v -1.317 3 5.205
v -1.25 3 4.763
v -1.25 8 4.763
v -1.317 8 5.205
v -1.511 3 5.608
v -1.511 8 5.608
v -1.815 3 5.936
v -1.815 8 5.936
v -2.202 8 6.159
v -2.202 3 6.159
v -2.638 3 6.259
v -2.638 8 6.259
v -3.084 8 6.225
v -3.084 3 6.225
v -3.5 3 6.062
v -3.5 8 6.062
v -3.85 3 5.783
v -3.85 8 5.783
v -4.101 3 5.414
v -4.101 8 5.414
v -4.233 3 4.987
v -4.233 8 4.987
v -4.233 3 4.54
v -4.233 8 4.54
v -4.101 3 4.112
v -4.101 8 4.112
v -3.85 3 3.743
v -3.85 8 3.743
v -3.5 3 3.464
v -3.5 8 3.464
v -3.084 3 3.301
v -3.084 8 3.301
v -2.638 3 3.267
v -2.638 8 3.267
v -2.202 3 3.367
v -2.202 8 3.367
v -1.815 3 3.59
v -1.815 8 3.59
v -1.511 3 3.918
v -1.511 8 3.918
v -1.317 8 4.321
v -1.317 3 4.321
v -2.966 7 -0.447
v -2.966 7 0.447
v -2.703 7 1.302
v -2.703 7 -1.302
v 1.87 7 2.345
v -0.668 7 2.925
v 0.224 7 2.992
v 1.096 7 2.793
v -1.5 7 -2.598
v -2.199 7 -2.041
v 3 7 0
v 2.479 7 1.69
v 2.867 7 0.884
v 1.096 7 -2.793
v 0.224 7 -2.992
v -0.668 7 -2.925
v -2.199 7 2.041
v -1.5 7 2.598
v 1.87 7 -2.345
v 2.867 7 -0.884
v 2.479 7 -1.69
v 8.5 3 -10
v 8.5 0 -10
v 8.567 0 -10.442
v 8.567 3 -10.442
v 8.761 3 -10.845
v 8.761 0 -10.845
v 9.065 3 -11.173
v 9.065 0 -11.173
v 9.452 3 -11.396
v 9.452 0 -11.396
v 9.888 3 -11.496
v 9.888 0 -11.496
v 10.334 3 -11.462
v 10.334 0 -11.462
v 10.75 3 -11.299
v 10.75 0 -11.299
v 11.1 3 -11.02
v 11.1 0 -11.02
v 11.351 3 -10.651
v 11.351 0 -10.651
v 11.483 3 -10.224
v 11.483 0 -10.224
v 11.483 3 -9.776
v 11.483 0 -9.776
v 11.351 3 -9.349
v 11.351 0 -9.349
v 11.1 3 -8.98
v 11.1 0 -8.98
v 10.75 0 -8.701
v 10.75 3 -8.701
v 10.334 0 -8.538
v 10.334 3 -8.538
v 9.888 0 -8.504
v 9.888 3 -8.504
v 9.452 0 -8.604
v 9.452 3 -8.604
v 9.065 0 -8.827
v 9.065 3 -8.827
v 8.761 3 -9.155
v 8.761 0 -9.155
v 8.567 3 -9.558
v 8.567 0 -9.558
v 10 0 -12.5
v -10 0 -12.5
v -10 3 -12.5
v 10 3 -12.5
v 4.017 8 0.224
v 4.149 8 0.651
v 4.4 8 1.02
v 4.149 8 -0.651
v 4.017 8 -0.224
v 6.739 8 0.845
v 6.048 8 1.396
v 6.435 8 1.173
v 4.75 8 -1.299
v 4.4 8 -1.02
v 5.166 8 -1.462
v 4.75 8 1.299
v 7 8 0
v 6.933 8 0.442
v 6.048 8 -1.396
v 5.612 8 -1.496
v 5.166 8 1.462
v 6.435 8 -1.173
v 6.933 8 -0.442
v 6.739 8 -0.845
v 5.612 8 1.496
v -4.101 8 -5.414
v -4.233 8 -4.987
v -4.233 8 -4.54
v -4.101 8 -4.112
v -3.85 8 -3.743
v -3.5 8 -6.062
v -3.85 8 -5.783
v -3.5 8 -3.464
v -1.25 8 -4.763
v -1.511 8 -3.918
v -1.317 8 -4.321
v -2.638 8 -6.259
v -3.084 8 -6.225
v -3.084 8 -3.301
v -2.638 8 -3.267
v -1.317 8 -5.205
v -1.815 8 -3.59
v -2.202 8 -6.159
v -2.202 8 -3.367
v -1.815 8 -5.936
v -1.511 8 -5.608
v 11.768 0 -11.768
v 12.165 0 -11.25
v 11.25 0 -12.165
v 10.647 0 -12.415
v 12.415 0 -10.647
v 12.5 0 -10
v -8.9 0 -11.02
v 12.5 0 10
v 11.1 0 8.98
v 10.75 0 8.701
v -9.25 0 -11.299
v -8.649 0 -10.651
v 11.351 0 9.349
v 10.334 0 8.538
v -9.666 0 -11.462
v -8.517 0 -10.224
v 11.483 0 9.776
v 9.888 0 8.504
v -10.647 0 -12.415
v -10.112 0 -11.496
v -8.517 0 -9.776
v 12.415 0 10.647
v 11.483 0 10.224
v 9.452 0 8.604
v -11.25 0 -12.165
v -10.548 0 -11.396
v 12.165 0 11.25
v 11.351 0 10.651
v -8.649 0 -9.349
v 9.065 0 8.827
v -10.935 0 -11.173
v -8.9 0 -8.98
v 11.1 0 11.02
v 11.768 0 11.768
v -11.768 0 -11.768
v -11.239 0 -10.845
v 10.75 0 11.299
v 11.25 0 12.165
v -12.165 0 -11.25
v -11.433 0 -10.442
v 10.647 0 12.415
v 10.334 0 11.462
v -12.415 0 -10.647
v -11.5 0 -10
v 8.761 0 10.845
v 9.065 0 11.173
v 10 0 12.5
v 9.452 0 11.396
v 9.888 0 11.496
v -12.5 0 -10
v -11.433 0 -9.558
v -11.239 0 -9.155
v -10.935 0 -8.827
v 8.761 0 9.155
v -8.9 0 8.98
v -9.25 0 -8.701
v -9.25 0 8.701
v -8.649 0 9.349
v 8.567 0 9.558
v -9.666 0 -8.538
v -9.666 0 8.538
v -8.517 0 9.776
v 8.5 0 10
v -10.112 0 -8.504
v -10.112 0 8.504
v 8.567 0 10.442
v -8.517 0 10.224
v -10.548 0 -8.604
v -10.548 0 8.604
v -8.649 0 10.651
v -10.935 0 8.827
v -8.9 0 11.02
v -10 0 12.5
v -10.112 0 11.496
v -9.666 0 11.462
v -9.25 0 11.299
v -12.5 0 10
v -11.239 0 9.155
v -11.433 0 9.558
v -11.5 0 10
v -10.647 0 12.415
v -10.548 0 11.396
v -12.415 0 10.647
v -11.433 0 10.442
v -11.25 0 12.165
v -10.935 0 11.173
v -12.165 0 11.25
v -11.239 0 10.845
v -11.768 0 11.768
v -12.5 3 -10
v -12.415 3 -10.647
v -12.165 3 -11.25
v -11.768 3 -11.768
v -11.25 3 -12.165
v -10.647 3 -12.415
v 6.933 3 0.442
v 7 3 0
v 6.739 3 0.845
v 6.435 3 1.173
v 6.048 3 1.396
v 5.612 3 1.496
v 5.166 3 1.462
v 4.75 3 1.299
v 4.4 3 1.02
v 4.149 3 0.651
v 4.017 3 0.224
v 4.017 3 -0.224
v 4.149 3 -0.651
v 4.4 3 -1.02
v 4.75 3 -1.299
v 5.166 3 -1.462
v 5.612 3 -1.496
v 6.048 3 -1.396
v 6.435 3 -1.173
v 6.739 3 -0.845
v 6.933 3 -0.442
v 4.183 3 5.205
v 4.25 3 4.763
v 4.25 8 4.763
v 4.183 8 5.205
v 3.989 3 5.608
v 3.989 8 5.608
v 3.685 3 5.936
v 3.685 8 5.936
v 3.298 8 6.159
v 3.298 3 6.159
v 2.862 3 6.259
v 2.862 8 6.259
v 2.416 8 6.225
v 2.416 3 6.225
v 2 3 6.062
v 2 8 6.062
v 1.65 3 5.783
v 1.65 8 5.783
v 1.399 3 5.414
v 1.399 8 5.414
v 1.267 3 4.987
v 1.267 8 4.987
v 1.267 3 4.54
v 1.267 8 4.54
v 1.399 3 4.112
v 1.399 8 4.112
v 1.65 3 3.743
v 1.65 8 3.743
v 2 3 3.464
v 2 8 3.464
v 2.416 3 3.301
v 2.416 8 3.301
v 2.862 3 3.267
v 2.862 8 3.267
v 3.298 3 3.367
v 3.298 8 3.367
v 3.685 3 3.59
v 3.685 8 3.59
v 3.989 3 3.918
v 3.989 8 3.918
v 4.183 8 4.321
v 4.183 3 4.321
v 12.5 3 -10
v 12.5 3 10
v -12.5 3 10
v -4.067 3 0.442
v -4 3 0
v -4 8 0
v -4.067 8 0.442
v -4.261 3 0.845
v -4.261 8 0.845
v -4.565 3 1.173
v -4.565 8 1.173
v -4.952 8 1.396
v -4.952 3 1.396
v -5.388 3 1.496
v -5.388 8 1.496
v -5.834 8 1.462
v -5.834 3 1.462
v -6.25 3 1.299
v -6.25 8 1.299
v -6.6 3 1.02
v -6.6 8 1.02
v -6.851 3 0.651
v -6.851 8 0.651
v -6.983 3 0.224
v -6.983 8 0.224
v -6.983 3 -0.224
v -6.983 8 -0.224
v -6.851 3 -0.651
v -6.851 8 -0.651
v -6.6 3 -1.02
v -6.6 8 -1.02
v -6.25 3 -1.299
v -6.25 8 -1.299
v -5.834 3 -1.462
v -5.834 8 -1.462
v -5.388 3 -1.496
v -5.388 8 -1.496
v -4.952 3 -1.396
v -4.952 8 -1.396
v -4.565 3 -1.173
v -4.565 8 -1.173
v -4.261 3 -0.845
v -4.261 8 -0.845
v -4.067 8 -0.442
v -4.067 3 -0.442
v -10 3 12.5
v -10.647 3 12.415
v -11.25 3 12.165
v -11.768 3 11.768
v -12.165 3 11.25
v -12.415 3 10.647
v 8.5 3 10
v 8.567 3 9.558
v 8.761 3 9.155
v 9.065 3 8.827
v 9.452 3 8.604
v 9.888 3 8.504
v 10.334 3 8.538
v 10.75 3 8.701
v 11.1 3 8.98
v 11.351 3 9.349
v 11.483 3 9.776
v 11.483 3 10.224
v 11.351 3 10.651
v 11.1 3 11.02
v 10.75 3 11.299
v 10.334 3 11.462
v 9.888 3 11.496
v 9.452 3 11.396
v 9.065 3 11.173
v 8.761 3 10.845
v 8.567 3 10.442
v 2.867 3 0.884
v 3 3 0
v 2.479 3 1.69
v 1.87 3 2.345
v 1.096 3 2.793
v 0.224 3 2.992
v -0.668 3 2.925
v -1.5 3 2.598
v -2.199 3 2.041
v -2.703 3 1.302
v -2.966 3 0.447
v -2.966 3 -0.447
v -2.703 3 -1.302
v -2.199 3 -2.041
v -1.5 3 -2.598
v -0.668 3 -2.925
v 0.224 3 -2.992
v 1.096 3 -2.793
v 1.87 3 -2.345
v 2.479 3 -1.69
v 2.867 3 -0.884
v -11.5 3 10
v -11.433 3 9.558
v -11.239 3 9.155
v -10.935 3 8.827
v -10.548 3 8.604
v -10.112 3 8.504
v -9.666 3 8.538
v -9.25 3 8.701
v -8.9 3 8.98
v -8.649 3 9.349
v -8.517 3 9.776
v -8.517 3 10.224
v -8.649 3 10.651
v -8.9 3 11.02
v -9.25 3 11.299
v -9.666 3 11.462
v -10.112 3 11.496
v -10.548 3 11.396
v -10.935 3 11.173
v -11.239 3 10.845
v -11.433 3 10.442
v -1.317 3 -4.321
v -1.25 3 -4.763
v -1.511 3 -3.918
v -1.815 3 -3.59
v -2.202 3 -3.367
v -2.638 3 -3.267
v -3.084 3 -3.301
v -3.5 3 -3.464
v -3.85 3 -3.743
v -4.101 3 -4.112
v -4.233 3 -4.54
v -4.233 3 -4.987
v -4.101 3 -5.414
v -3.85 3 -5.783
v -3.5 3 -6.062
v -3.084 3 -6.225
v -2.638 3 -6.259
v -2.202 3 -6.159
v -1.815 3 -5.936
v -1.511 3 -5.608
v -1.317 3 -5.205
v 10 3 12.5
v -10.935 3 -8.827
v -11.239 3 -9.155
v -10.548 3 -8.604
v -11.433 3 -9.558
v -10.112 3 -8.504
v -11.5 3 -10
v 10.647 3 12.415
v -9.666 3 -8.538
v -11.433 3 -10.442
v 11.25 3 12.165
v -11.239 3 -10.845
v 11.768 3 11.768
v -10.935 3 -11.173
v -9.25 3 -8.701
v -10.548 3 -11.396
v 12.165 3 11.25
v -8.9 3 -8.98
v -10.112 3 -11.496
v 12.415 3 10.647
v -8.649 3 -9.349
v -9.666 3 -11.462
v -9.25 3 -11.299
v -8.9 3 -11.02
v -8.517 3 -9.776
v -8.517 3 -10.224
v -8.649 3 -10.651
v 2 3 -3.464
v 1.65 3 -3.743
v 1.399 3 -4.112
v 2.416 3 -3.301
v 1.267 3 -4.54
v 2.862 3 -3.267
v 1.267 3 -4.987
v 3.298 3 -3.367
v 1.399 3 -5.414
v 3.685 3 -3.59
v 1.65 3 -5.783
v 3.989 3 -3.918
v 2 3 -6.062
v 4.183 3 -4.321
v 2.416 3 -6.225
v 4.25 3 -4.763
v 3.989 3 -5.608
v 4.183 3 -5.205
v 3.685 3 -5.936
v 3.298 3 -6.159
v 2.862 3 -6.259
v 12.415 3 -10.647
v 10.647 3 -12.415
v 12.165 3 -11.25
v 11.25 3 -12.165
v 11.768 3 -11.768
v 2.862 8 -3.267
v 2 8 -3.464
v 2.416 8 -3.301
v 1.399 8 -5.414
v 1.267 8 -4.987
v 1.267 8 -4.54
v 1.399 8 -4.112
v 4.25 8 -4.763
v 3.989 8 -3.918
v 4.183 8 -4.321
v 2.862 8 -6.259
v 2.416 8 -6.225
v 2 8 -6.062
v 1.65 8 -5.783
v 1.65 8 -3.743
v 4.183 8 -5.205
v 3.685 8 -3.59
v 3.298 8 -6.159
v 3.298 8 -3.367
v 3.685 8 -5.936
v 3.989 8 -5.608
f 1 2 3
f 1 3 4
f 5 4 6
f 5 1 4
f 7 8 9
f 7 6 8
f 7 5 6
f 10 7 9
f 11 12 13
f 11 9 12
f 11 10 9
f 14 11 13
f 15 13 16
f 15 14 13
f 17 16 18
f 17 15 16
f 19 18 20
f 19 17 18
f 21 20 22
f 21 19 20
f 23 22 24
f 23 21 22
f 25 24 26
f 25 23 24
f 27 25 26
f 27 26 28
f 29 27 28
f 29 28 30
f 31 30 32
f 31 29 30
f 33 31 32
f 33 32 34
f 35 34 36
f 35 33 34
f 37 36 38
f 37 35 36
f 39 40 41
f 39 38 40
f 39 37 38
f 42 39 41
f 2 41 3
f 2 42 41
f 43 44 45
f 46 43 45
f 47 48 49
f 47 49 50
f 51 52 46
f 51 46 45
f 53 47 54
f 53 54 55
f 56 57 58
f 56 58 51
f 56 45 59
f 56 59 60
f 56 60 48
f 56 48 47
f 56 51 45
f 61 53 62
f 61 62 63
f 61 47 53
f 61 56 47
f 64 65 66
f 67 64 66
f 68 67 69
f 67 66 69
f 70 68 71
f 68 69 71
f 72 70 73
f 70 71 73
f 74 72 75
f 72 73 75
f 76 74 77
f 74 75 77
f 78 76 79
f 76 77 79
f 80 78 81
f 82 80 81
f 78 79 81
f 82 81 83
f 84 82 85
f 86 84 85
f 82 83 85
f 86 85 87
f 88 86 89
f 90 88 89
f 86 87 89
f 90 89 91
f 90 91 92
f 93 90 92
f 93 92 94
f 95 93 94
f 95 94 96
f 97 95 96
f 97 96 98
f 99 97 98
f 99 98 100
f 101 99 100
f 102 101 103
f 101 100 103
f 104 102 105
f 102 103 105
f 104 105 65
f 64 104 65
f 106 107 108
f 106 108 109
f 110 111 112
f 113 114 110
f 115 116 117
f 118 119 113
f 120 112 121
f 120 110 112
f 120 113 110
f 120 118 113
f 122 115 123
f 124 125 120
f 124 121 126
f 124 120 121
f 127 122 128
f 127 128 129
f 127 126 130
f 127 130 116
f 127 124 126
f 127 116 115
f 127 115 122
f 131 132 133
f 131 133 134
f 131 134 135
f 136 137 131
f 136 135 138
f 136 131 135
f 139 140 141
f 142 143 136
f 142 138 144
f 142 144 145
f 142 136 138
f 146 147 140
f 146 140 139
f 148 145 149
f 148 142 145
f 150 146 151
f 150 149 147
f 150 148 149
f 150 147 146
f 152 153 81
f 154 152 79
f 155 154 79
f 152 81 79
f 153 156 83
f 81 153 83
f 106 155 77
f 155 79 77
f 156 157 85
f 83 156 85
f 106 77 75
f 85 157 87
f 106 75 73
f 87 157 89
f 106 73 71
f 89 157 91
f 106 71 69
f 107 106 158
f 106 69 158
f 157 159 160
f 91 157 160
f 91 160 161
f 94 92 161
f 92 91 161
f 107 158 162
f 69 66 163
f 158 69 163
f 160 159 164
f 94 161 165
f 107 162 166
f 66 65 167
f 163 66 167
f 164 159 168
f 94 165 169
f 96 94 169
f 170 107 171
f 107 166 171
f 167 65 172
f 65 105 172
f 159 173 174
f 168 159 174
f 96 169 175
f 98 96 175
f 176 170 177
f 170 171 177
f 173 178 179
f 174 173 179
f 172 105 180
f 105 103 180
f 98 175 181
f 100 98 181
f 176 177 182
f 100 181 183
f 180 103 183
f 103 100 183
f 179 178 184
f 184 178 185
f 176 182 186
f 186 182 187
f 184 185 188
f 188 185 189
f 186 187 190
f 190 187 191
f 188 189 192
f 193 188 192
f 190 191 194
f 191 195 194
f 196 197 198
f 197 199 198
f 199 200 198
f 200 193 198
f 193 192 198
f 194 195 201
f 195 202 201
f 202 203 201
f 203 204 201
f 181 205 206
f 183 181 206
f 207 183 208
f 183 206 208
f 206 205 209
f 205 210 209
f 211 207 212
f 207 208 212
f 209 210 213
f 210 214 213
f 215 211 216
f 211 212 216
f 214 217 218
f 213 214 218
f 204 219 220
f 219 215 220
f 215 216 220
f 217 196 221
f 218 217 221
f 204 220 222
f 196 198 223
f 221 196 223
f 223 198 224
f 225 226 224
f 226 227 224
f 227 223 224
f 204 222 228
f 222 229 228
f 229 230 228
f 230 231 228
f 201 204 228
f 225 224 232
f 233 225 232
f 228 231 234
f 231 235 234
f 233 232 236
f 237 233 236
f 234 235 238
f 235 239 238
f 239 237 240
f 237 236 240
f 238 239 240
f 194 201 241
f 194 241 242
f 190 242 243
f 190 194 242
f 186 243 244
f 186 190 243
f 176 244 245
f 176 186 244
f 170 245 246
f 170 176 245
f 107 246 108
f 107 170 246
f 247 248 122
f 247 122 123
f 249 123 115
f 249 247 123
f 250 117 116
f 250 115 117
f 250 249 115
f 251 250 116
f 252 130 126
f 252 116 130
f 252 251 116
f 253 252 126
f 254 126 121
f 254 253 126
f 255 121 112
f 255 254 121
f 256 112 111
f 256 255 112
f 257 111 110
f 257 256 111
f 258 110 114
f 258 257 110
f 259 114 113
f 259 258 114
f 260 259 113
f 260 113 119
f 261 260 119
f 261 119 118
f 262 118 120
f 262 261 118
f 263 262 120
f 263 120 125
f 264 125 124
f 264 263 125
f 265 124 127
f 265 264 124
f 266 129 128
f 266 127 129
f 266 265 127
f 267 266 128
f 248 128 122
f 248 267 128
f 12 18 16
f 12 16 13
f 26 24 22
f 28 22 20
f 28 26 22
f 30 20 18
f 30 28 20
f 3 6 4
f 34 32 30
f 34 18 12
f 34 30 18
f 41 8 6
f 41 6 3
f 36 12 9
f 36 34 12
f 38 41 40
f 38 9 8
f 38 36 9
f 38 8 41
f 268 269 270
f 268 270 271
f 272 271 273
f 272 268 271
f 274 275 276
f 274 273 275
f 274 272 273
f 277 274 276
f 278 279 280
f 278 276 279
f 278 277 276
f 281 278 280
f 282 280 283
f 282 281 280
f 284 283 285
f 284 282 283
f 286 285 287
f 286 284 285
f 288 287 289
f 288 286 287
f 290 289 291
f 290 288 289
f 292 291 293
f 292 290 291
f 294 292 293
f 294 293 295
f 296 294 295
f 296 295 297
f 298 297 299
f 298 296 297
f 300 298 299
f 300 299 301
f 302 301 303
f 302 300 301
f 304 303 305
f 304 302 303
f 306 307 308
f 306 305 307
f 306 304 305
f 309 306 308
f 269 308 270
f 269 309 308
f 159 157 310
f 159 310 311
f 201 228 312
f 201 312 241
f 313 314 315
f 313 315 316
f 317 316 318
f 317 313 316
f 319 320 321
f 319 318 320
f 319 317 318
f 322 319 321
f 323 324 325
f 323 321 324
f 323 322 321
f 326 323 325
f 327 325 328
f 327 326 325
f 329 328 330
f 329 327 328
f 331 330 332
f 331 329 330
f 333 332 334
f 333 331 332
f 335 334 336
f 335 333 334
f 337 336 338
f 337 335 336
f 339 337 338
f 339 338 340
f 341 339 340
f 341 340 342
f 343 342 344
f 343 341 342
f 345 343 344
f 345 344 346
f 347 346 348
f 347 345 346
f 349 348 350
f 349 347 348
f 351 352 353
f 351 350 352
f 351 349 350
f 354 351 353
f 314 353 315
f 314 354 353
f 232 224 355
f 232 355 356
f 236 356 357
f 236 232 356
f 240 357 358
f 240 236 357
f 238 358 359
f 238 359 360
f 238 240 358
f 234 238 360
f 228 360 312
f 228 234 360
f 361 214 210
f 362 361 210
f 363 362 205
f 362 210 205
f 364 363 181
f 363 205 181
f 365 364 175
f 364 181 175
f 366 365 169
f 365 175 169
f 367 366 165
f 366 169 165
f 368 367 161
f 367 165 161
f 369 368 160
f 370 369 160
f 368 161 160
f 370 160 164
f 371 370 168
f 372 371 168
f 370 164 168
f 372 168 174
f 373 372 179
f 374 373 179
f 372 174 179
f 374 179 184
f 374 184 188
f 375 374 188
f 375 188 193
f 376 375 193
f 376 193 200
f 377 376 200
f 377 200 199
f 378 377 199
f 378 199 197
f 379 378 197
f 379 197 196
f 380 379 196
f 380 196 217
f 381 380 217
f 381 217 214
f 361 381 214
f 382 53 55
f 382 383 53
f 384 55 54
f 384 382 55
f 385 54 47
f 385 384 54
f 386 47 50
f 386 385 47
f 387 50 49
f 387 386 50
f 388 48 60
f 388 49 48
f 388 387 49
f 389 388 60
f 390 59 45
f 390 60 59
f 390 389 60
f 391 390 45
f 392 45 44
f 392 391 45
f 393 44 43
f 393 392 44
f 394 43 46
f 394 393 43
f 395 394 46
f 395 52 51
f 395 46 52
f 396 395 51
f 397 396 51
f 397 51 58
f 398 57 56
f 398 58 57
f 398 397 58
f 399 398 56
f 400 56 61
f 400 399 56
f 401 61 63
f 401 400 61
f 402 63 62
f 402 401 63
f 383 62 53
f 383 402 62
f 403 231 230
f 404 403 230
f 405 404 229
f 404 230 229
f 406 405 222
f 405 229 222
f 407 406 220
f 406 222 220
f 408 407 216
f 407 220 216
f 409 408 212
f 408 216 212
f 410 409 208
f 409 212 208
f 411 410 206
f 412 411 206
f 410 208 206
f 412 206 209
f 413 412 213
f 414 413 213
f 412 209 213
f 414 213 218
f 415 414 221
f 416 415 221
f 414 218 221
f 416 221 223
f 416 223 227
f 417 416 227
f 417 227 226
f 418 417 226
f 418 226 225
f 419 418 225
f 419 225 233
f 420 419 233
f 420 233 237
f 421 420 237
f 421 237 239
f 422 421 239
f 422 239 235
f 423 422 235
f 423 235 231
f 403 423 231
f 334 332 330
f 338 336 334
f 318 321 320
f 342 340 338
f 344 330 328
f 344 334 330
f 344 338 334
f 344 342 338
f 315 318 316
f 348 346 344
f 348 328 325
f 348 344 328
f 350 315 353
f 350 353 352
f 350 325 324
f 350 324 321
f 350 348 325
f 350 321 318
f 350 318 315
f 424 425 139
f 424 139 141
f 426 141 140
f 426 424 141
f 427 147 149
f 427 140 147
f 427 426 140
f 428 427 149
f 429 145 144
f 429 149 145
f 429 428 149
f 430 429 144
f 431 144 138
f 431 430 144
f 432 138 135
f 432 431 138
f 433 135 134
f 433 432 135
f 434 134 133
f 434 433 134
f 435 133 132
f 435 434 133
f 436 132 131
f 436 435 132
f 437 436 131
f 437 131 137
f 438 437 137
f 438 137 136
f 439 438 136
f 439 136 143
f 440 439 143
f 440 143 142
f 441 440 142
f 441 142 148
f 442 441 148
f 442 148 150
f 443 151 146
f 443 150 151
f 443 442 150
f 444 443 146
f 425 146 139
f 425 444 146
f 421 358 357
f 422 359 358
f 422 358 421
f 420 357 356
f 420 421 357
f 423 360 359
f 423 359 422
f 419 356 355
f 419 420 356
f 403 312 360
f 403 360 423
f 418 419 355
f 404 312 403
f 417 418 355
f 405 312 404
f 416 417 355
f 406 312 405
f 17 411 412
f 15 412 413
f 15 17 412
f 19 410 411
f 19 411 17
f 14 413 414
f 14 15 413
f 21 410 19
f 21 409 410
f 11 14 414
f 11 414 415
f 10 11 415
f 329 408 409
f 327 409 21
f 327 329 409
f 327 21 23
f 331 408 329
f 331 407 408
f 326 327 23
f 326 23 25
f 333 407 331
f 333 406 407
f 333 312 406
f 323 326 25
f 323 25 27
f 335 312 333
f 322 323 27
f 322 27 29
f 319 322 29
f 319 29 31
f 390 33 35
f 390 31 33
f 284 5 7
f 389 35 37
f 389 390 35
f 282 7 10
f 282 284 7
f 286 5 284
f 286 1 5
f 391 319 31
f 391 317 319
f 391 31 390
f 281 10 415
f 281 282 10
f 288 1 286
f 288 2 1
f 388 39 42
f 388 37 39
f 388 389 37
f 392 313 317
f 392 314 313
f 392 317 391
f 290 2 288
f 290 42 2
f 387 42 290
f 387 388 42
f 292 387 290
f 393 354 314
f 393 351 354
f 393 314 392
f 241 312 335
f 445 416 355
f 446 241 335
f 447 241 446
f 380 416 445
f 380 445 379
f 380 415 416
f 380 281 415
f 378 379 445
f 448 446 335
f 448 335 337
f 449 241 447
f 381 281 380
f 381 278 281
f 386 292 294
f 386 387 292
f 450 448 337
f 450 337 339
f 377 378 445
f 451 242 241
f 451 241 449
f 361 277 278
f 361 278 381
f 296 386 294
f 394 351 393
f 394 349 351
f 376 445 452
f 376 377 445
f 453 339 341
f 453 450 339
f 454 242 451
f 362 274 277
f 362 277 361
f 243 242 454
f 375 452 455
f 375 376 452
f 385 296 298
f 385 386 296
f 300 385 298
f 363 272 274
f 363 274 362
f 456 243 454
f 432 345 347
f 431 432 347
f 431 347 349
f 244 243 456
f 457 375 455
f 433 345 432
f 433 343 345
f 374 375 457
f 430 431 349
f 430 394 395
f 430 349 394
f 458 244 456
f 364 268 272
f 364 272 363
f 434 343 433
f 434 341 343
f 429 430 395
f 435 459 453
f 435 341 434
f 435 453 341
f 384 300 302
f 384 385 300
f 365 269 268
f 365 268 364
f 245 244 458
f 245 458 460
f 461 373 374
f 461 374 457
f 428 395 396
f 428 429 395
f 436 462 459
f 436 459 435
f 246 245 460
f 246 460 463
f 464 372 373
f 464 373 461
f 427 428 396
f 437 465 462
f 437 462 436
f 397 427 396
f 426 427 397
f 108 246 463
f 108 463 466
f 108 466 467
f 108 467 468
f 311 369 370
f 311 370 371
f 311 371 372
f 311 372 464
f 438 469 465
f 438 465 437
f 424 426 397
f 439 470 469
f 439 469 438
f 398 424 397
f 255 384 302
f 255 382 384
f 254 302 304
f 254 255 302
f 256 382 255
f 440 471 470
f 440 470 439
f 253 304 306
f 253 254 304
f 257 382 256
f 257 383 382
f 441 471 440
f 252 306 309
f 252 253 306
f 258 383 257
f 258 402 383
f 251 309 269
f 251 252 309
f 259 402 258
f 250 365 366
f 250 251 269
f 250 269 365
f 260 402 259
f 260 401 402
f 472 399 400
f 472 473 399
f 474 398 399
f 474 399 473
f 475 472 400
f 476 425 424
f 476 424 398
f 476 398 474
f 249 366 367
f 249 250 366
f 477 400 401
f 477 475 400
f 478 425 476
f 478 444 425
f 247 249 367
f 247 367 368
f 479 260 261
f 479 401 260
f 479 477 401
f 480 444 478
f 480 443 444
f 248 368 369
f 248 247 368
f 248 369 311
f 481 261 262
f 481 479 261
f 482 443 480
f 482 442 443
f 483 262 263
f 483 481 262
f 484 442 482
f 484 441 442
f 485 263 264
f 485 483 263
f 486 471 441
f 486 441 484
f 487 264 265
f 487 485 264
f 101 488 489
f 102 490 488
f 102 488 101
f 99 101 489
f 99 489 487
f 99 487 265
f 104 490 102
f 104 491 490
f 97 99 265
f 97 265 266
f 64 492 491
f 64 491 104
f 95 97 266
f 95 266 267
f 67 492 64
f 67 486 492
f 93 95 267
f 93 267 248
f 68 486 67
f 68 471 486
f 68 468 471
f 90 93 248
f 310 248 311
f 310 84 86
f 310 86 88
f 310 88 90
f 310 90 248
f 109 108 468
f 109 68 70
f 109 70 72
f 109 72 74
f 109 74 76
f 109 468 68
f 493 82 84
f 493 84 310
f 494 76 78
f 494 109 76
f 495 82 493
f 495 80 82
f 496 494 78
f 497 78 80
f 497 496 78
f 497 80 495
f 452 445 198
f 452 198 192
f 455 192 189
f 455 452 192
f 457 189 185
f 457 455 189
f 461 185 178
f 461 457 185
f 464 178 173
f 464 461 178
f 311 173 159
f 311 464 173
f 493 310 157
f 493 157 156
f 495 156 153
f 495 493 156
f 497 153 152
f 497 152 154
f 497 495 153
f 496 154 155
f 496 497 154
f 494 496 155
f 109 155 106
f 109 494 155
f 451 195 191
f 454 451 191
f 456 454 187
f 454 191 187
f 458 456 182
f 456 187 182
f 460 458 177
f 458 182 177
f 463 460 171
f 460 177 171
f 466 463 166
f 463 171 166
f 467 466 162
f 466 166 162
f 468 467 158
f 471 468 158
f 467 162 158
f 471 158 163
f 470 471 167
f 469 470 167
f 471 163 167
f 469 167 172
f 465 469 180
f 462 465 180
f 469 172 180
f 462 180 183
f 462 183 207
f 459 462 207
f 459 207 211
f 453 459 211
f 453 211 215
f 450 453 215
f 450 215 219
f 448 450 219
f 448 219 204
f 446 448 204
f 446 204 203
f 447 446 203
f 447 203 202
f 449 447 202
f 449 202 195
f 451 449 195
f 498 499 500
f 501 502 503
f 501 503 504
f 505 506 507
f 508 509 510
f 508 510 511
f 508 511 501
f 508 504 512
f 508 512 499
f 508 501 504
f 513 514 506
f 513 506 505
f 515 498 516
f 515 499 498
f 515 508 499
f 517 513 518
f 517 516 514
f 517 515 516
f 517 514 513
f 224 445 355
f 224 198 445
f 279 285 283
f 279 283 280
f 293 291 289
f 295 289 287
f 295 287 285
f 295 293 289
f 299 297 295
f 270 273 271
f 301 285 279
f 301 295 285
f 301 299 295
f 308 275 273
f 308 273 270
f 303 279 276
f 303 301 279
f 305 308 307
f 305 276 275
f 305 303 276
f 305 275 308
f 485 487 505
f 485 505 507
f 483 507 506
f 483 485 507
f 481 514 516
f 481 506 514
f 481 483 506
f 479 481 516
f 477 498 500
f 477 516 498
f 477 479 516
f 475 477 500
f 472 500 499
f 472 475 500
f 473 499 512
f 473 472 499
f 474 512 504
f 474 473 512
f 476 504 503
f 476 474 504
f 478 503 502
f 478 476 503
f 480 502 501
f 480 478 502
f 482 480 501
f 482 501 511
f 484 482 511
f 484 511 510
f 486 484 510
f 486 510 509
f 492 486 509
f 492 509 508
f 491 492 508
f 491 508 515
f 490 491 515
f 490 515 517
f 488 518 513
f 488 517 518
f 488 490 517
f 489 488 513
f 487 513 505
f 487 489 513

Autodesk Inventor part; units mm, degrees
ref_plane "YZ Plane" through (0, 0, 0) normal (1, 0, 0) x (0, 1, 0)
ref_plane "XZ Plane" through (0, 0, 0) normal (0, 1, 0) x (-1, 0, 0)
ref_plane "XY Plane" through (0, 0, 0) normal (0, 0, 1) x (1, 0, 0)
sketch "Sketch1" plane through (0, 0, 0) normal (0, 1, 0) x (-1, 0, 0)
  line L0 (-12.5, 12.5) -> (12.5, 12.5)
  line L1 (12.5, 12.5) -> (12.5, -12.5)
  line L2 (12.5, -12.5) -> (-12.5, -12.5)
  line L3 (-12.5, -12.5) -> (-12.5, 12.5)
  line L4 (-12.5, 12.5) -> (12.5, -12.5) construction
  line L5 (12.5, 12.5) -> (-12.5, -12.5) construction
  line L6 (-10, 10) -> (10, 10) construction
  line L7 (10, 10) -> (10, -10) construction
  line L8 (10, -10) -> (-10, -10) construction
  line L9 (-10, -10) -> (-10, 10) construction
  line L10 (-10, 10) -> (10, -10) construction
  line L11 (10, 10) -> (-10, -10) construction
  circle A0 centre (10, 10) radius 1.5
  circle A1 centre (10, -10) radius 1.5
  circle A2 centre (-10, -10) radius 1.5
  circle A3 centre (-10, 10) radius 1.5
  point P0 (0, 0)
  dimension "d0" = 25
  dimension "d1" = 25
  dimension "d2" = 3
  dimension "d3" = 3
  dimension "d4" = 3
  dimension "d5" = 3
  dimension "d6" = 20
extrude "Extrusion1" add sketch "Sketch1" along normal blind 3
sketch "Sketch2" plane through (0, 3, 0) normal (0, 1, 0) x (1, 0, 0)
  circle A0 centre (0, 0) radius 3
  circle A1 centre (-5.5, 0) radius 1.5
  circle A2 centre (-2.75, -4.7631) radius 1.5
  circle A3 centre (2.75, -4.7631) radius 1.5
  circle A4 centre (5.5, 0) radius 1.5
  circle A5 centre (2.75, 4.7631) radius 1.5
  circle A6 centre (-2.75, 4.7631) radius 1.5
  dimension "d9" = 6
  dimension "d10" = 3
  dimension "d11" = 5.5
  dimension "d14" = 360
extrude "Extrusion2" add sketch "Sketch2" along normal blind 5 contours A1 | A2 | A3 | A4 | A5 | A6
sketch "Sketch3" plane through (0, 3, 0) normal (0, 1, 0) x (1, 0, 0)
  circle A0 centre (0, 0) radius 3
  dimension "d18" = 6
extrude "Extrusion3" add sketch "Sketch3" along normal blind 4
sketch "Sketch5" plane through (-5.5, 8, 0) normal (0, 1, 0) x (1, 0, 0)
  circle A0 centre (0, 0) radius 2.5
  circle A1 centre (2.75, -4.7631) radius 2.5
  circle A2 centre (8.25, -4.7631) radius 2.5
  circle A3 centre (11, 0) radius 2.5
  circle A4 centre (8.25, 4.7631) radius 2.5
  circle A5 centre (2.75, 4.7631) radius 2.5
  circle A6 centre (5.5, 0) radius 3.5
  circle A7 centre (0, 0) radius 1.4875
  circle A8 centre (2.75, -4.7631) radius 1.4875
  circle A9 centre (8.25, -4.7631) radius 1.4875
  circle A10 centre (11, 0) radius 1.4875
  circle A11 centre (8.25, 4.7631) radius 1.4875
  circle A12 centre (2.75, 4.7631) radius 1.4875
  line L0 (18, 12.5) -> (-7, 12.5) projected
  line L1 (18, -12.5) -> (-7, -12.5)
  line L2 (-7, -12.5) -> (-7, 12.5)
  line L3 (-7, 12.5) -> (18, 12.5)
  line L4 (18, 12.5) -> (18, -12.5)
  line L5 (18, -12.5) -> (-7, 12.5) construction
  line L6 (-7, -12.5) -> (18, 12.5) construction
  circle A13 centre (-4.5, -10) radius 1.5 projected
  circle A14 centre (-4.5, -10) radius 1.65
  circle A15 centre (-4.5, 10) radius 1.5 projected
  circle A16 centre (-4.5, 10) radius 1.65
  circle A17 centre (15.5, 10) radius 1.5 projected
  circle A18 centre (15.5, 10) radius 1.65
  circle A19 centre (15.5, -10) radius 1.5 projected
  circle A20 centre (15.5, -10) radius 1.65
  point P0 (8.7955, -1.179)
  point P1 (8.1687, -2.2645)
  point P2 (6.1267, -3.4434)
  point P3 (4.8733, -3.4434)
  point P4 (2.8313, -2.2645)
  point P5 (2.2045, -1.179)
  point P6 (2.2045, 1.179)
  point P7 (2.8313, 2.2645)
  point P8 (4.8733, 3.4434)
  point P9 (6.1267, 3.4434)
  point P10 (8.1687, 2.2645)
  point P11 (8.7955, 1.179)
  dimension "d21" = 5
  dimension "d24" = 360
  dimension "d26" = 7
  dimension "d29" = 360
extrude "Extrusion4" add sketch "Sketch5" against normal blind 5 contours L4 L1 L2 L0 | A14 | A16 | A18 | A20
fillet "Fillet1" radius 0.5 12 edges at (-2.6687, 5.5, 2.2645) (-0.6267, 5.5, 3.4434) (2.6687, 5.5, 2.2645) (0.6267, 5.5, 3.4434) (-3.2955, 5.5, -1.179) (-3.2955, 5.5, 1.179) (-0.6267, 5.5, -3.4434) (-2.6687, 5.5, -2.2645) (2.6687, 5.5, -2.2645) (0.6267, 5.5, -3.4434) (3.2955, 5.5, 1.179) (3.2955, 5.5, -1.179)
fillet "Fillet2" radius 2.5 4 edges at (12.5, 4, -12.5) (-12.5, 4, -12.5) (12.5, 4, 12.5) (-12.5, 4, 12.5)
sketch "Sketch7" plane through (0, 7, 0) normal (0, 1, 0) x (1, 0, 0)
  circle A0 centre (0, 0) radius 1
extrude "Extrusion5" [suppressed]
sketch "Sketch8" plane through (-5.5, 8, 0) normal (0, 1, 0) x (1, 0, 0)
  circle A0 centre (0, 0) radius 1
  point P0 (5.5, 0)
  dimension "d37" = 2
extrude "Extrusion6" [suppressed]
pattern_circular "Circular Pattern1" [suppressed]
sketch "Sketch9" plane through (-5.5, 8, 0) normal (0, 1, 0) x (1, 0, 0)
  line L0 (-7.0276, -1) -> (-2, -1)
  line L1 (-2, -1) -> (-2, 1)
  line L2 (-2, 1) -> (-7.0276, 1)
  line L3 (-7.0276, 1) -> (-7.0276, -1)
  line L4 (-7.0276, -1) -> (-2, 1) construction
  line L5 (-2, -1) -> (-7.0276, 1) construction
  point P0 (5.5, 0)
  point P1 (-4.5138, 0)
extrude "Extrusion7" cut sketch "Sketch9" against normal blind 5
thicken "Thicken1" operation add thickness 5 both sides no extend neighbours yes toward (0, -1, 0) faces at (0.7594, 8, 10.7394)
properties part number "PDMS stretcher mould A"
